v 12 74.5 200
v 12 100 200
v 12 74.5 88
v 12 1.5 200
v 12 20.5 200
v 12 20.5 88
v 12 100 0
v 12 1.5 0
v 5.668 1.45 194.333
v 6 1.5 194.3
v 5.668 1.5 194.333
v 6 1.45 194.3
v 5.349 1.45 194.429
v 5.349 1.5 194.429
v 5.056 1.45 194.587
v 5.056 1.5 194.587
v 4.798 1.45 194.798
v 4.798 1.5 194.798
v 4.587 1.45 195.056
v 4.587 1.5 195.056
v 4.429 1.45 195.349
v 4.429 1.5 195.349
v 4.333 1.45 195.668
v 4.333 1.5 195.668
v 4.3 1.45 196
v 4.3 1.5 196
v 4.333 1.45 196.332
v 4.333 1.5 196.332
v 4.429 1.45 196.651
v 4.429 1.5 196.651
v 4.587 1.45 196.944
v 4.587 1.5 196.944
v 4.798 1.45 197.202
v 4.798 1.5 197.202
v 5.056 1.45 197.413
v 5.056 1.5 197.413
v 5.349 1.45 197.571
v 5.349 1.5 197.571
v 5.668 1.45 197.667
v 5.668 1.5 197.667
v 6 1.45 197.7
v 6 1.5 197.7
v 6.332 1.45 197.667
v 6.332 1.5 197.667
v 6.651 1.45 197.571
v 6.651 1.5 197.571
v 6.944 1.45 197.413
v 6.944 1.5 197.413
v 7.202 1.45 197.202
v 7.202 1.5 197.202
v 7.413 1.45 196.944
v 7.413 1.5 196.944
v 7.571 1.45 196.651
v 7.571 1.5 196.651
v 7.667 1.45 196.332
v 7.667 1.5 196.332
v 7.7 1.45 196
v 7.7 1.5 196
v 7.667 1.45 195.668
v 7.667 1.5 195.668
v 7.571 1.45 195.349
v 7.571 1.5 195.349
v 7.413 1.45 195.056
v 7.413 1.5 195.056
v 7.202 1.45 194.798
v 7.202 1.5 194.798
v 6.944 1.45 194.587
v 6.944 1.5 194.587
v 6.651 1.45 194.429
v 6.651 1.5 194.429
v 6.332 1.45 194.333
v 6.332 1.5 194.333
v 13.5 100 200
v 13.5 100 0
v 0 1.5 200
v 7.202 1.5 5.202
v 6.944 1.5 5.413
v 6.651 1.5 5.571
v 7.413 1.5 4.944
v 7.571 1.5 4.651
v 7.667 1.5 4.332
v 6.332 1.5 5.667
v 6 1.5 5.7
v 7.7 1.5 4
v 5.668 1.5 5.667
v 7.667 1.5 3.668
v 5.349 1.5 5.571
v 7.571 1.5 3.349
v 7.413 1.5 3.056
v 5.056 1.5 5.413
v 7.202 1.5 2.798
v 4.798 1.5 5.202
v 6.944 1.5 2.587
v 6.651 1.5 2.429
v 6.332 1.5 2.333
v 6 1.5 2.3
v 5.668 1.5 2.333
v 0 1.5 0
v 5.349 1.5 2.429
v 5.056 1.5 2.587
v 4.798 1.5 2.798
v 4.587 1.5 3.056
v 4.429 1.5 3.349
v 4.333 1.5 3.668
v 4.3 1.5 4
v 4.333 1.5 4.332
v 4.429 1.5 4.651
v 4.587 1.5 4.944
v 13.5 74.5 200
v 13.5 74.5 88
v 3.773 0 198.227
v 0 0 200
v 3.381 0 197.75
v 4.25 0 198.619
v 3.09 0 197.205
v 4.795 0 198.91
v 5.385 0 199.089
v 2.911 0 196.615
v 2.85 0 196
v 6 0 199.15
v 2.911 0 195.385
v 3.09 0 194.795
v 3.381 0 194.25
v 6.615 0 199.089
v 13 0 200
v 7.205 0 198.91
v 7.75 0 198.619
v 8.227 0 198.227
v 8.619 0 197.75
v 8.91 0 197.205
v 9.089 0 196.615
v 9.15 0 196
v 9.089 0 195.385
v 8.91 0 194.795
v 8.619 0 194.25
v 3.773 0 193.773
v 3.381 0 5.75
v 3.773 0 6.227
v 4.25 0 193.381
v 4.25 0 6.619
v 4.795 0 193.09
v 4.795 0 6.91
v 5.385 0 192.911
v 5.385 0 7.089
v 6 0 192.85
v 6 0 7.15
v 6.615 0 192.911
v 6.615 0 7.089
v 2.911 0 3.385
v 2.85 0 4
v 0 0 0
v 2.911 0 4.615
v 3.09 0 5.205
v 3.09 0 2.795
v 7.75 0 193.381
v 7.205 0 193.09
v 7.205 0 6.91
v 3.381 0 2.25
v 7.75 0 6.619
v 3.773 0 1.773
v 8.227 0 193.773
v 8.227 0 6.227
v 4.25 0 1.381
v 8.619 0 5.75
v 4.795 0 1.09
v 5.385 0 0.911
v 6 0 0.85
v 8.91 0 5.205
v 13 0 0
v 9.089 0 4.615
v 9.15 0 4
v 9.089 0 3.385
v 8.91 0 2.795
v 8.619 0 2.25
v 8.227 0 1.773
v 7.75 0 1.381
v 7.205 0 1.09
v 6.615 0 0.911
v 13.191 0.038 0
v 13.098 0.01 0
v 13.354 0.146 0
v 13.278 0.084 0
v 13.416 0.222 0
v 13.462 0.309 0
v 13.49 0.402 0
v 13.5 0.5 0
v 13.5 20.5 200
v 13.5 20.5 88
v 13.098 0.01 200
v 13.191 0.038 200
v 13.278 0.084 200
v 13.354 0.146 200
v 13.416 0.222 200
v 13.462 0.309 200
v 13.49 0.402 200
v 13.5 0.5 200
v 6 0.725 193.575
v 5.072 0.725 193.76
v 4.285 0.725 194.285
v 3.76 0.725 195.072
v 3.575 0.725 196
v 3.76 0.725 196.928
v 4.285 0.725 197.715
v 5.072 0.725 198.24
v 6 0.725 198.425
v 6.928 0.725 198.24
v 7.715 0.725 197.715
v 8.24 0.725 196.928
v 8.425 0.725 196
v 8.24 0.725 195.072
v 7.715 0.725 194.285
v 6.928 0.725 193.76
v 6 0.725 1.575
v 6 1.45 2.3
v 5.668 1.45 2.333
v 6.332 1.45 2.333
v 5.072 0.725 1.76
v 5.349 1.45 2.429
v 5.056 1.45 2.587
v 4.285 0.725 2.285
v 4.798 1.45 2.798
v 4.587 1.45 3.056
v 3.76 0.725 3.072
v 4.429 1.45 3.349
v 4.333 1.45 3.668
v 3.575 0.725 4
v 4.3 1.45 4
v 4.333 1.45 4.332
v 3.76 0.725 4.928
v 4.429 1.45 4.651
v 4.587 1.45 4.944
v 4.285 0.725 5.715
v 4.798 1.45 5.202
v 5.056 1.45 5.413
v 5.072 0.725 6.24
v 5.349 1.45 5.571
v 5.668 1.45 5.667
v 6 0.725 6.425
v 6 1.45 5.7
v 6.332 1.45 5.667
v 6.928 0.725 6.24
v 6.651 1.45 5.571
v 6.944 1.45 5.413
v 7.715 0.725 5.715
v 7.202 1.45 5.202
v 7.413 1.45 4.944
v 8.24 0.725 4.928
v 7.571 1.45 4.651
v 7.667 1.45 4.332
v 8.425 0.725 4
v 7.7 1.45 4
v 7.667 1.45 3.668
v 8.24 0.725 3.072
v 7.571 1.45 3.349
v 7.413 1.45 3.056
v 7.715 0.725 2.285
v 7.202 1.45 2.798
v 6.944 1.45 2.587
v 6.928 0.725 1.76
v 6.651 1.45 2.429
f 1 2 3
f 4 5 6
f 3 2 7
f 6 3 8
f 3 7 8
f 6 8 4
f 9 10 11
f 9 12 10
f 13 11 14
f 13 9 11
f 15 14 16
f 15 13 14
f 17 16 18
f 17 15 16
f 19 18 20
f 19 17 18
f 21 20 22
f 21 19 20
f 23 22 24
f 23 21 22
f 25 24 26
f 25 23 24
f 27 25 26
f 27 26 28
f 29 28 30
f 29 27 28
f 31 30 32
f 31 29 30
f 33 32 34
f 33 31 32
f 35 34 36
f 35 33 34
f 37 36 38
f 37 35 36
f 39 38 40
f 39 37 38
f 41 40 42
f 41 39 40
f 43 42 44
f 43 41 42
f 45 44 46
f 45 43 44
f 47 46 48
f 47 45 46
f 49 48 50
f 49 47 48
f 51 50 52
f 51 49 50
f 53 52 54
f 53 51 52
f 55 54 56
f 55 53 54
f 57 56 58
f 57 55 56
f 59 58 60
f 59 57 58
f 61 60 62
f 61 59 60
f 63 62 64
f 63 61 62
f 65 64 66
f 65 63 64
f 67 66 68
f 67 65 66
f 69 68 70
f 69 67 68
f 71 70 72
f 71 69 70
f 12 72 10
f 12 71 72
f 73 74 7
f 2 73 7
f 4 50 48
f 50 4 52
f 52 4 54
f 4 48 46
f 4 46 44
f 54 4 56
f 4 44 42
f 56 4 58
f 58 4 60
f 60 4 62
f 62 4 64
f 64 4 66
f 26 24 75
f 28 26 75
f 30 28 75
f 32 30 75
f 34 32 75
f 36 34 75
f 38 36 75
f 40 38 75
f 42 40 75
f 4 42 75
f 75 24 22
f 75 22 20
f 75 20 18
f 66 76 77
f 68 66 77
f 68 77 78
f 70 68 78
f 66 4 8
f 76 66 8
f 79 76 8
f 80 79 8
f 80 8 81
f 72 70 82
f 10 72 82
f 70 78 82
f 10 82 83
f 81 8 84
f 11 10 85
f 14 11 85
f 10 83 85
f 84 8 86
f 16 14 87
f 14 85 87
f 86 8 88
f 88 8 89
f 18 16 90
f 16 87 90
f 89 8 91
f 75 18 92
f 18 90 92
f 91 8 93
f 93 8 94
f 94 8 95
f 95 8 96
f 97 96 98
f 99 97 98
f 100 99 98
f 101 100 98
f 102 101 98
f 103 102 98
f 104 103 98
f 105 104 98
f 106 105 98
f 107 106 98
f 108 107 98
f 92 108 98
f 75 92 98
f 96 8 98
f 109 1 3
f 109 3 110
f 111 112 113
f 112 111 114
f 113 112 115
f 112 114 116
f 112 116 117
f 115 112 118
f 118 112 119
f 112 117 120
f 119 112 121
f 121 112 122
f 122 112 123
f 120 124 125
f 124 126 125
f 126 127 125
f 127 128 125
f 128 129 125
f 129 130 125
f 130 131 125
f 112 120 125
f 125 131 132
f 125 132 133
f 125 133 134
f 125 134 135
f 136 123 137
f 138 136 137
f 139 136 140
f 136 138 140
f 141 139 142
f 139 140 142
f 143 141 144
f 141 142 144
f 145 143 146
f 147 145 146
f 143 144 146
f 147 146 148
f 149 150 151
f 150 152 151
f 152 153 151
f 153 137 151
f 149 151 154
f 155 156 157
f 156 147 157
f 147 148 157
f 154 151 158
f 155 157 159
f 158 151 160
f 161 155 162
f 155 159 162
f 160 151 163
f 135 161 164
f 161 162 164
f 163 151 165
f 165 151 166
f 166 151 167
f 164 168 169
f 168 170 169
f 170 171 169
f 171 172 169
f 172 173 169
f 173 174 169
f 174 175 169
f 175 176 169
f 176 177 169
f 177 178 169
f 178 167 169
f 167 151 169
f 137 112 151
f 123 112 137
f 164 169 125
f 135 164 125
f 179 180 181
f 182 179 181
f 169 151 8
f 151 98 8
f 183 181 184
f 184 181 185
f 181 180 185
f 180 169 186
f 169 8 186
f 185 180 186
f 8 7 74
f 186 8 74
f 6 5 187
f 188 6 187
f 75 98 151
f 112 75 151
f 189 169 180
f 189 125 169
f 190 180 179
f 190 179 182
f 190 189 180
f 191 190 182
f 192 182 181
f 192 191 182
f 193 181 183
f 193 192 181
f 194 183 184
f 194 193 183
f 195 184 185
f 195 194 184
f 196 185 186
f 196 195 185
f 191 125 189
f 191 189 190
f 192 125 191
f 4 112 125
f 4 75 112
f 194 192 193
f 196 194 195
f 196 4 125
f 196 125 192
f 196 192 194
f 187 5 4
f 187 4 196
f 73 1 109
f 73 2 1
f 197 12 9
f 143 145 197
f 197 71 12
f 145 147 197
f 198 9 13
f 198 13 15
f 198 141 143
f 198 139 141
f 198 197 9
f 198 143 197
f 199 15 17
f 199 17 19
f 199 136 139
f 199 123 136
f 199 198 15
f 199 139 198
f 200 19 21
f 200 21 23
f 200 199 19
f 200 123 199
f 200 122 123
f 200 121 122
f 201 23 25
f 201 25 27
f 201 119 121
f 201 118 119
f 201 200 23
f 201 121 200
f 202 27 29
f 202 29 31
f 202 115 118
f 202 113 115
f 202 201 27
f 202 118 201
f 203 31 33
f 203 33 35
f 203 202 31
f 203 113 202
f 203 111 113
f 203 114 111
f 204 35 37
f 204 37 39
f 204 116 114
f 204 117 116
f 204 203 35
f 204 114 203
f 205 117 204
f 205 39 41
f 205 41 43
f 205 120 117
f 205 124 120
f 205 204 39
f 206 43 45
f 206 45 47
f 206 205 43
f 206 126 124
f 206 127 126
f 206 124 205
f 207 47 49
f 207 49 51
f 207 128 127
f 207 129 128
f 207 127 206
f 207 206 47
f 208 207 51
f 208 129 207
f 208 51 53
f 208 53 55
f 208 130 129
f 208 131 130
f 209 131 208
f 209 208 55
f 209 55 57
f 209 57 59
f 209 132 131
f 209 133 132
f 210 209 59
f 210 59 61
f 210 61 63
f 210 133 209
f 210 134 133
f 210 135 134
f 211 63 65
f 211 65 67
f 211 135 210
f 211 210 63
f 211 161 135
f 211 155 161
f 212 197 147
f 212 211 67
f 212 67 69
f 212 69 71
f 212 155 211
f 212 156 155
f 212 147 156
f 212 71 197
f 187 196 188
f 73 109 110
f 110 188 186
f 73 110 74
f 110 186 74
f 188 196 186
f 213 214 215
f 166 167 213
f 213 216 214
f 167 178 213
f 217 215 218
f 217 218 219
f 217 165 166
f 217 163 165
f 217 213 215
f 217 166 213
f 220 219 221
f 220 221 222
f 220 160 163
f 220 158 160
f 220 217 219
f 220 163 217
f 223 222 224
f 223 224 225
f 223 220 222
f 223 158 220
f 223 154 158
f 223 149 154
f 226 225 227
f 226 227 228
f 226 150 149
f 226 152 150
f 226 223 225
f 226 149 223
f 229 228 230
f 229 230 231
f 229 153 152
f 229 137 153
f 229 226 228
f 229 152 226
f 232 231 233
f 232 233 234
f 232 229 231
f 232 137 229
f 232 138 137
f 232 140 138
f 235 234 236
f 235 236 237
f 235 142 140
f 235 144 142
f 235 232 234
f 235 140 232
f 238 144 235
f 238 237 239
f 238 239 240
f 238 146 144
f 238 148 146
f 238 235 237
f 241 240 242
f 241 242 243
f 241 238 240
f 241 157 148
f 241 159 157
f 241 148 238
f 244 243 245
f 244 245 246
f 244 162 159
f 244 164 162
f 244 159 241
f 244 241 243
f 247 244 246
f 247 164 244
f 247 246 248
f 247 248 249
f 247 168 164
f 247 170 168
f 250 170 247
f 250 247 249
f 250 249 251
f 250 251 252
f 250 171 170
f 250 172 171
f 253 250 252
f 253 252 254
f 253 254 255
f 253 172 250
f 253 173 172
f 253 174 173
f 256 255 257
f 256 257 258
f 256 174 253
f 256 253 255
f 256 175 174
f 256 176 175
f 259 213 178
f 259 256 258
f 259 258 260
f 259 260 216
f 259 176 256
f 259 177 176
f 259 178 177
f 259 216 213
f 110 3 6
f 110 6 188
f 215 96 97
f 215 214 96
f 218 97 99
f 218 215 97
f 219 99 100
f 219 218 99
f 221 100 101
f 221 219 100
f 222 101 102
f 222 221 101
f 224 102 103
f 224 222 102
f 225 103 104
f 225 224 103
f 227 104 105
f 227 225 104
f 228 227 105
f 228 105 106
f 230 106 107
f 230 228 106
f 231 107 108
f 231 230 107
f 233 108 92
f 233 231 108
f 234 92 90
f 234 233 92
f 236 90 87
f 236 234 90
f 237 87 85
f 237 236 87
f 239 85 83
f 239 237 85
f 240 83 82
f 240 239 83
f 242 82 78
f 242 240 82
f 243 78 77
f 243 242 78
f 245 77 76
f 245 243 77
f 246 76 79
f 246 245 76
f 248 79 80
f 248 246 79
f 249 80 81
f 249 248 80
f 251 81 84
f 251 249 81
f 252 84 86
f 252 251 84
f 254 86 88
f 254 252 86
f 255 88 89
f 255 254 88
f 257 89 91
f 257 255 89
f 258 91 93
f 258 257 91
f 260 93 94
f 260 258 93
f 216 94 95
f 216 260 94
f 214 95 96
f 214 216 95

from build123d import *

# Parameters (mm, degrees)
EXTRUDE1_DEPTH                               = 200
FILLET1_R                                    = 0.5
CUT_EXTRUDE2_START                           = 200
SKETCH2_W                                    = 1.5
SKETCH2_H                                    = 54
CUT_EXTRUDE2_DEPTH                           = 112
CSK_FOR_M3_COUNTERSUNK_FLAT_HEAD_SCR_2_COUNT = 2
CSK_FOR_M3_COUNTERSUNK_FLAT_HEAD_SCR_2_PITCH = 192


with BuildPart() as part:
    # Sketch1 → Extrude1 (new body)
    with BuildSketch(Plane.XY):
        Polygon((0, 0), (13.5, 0), (13.5, 100), (12, 100), (12, 1.5), (0, 1.5), align=None)
    extrude(amount=EXTRUDE1_DEPTH)

    # Fillet1
    fillet1_edges = [part.edges().sort_by_distance(p)[0] for p in [
        (13.5, 0, 100),
    ]]
    fillet(fillet1_edges, radius=FILLET1_R)

    # Sketch2 → Cut-Extrude2 (cut)
    with BuildSketch(Plane.XY.offset(CUT_EXTRUDE2_START)):
        with Locations((12.75, 47.5)):
            Rectangle(SKETCH2_W, SKETCH2_H)
    extrude(amount=-CUT_EXTRUDE2_DEPTH, mode=Mode.SUBTRACT)

    # Sketch5 → CSK for M3 Countersunk Flat Head Screw1 (revolve, cut)
    with BuildSketch(Plane(origin=(6, 0, 196), x_dir=(0, 0, -1), z_dir=(1, 0, 0))):
        Polygon((0, 0), (0, 2.521463052), (1.7, 1.5), (1.7, 1.45), (3.15, 0), align=None)
    csk_for_m3_countersunk_flat_head_screw1 = revolve(axis=Axis((6, -6.35, 196), (0, 1, 0)), mode=Mode.SUBTRACT)

    # CSK for M3 Countersunk Flat Head Scr 2: CSK for M3 Countersunk Flat Head Screw1 ×2
    with Locations(*[(0, 0, -i * CSK_FOR_M3_COUNTERSUNK_FLAT_HEAD_SCR_2_PITCH) for i in range(1, CSK_FOR_M3_COUNTERSUNK_FLAT_HEAD_SCR_2_COUNT)]):
        add(csk_for_m3_countersunk_flat_head_screw1, mode=Mode.SUBTRACT)


solid = part.part
